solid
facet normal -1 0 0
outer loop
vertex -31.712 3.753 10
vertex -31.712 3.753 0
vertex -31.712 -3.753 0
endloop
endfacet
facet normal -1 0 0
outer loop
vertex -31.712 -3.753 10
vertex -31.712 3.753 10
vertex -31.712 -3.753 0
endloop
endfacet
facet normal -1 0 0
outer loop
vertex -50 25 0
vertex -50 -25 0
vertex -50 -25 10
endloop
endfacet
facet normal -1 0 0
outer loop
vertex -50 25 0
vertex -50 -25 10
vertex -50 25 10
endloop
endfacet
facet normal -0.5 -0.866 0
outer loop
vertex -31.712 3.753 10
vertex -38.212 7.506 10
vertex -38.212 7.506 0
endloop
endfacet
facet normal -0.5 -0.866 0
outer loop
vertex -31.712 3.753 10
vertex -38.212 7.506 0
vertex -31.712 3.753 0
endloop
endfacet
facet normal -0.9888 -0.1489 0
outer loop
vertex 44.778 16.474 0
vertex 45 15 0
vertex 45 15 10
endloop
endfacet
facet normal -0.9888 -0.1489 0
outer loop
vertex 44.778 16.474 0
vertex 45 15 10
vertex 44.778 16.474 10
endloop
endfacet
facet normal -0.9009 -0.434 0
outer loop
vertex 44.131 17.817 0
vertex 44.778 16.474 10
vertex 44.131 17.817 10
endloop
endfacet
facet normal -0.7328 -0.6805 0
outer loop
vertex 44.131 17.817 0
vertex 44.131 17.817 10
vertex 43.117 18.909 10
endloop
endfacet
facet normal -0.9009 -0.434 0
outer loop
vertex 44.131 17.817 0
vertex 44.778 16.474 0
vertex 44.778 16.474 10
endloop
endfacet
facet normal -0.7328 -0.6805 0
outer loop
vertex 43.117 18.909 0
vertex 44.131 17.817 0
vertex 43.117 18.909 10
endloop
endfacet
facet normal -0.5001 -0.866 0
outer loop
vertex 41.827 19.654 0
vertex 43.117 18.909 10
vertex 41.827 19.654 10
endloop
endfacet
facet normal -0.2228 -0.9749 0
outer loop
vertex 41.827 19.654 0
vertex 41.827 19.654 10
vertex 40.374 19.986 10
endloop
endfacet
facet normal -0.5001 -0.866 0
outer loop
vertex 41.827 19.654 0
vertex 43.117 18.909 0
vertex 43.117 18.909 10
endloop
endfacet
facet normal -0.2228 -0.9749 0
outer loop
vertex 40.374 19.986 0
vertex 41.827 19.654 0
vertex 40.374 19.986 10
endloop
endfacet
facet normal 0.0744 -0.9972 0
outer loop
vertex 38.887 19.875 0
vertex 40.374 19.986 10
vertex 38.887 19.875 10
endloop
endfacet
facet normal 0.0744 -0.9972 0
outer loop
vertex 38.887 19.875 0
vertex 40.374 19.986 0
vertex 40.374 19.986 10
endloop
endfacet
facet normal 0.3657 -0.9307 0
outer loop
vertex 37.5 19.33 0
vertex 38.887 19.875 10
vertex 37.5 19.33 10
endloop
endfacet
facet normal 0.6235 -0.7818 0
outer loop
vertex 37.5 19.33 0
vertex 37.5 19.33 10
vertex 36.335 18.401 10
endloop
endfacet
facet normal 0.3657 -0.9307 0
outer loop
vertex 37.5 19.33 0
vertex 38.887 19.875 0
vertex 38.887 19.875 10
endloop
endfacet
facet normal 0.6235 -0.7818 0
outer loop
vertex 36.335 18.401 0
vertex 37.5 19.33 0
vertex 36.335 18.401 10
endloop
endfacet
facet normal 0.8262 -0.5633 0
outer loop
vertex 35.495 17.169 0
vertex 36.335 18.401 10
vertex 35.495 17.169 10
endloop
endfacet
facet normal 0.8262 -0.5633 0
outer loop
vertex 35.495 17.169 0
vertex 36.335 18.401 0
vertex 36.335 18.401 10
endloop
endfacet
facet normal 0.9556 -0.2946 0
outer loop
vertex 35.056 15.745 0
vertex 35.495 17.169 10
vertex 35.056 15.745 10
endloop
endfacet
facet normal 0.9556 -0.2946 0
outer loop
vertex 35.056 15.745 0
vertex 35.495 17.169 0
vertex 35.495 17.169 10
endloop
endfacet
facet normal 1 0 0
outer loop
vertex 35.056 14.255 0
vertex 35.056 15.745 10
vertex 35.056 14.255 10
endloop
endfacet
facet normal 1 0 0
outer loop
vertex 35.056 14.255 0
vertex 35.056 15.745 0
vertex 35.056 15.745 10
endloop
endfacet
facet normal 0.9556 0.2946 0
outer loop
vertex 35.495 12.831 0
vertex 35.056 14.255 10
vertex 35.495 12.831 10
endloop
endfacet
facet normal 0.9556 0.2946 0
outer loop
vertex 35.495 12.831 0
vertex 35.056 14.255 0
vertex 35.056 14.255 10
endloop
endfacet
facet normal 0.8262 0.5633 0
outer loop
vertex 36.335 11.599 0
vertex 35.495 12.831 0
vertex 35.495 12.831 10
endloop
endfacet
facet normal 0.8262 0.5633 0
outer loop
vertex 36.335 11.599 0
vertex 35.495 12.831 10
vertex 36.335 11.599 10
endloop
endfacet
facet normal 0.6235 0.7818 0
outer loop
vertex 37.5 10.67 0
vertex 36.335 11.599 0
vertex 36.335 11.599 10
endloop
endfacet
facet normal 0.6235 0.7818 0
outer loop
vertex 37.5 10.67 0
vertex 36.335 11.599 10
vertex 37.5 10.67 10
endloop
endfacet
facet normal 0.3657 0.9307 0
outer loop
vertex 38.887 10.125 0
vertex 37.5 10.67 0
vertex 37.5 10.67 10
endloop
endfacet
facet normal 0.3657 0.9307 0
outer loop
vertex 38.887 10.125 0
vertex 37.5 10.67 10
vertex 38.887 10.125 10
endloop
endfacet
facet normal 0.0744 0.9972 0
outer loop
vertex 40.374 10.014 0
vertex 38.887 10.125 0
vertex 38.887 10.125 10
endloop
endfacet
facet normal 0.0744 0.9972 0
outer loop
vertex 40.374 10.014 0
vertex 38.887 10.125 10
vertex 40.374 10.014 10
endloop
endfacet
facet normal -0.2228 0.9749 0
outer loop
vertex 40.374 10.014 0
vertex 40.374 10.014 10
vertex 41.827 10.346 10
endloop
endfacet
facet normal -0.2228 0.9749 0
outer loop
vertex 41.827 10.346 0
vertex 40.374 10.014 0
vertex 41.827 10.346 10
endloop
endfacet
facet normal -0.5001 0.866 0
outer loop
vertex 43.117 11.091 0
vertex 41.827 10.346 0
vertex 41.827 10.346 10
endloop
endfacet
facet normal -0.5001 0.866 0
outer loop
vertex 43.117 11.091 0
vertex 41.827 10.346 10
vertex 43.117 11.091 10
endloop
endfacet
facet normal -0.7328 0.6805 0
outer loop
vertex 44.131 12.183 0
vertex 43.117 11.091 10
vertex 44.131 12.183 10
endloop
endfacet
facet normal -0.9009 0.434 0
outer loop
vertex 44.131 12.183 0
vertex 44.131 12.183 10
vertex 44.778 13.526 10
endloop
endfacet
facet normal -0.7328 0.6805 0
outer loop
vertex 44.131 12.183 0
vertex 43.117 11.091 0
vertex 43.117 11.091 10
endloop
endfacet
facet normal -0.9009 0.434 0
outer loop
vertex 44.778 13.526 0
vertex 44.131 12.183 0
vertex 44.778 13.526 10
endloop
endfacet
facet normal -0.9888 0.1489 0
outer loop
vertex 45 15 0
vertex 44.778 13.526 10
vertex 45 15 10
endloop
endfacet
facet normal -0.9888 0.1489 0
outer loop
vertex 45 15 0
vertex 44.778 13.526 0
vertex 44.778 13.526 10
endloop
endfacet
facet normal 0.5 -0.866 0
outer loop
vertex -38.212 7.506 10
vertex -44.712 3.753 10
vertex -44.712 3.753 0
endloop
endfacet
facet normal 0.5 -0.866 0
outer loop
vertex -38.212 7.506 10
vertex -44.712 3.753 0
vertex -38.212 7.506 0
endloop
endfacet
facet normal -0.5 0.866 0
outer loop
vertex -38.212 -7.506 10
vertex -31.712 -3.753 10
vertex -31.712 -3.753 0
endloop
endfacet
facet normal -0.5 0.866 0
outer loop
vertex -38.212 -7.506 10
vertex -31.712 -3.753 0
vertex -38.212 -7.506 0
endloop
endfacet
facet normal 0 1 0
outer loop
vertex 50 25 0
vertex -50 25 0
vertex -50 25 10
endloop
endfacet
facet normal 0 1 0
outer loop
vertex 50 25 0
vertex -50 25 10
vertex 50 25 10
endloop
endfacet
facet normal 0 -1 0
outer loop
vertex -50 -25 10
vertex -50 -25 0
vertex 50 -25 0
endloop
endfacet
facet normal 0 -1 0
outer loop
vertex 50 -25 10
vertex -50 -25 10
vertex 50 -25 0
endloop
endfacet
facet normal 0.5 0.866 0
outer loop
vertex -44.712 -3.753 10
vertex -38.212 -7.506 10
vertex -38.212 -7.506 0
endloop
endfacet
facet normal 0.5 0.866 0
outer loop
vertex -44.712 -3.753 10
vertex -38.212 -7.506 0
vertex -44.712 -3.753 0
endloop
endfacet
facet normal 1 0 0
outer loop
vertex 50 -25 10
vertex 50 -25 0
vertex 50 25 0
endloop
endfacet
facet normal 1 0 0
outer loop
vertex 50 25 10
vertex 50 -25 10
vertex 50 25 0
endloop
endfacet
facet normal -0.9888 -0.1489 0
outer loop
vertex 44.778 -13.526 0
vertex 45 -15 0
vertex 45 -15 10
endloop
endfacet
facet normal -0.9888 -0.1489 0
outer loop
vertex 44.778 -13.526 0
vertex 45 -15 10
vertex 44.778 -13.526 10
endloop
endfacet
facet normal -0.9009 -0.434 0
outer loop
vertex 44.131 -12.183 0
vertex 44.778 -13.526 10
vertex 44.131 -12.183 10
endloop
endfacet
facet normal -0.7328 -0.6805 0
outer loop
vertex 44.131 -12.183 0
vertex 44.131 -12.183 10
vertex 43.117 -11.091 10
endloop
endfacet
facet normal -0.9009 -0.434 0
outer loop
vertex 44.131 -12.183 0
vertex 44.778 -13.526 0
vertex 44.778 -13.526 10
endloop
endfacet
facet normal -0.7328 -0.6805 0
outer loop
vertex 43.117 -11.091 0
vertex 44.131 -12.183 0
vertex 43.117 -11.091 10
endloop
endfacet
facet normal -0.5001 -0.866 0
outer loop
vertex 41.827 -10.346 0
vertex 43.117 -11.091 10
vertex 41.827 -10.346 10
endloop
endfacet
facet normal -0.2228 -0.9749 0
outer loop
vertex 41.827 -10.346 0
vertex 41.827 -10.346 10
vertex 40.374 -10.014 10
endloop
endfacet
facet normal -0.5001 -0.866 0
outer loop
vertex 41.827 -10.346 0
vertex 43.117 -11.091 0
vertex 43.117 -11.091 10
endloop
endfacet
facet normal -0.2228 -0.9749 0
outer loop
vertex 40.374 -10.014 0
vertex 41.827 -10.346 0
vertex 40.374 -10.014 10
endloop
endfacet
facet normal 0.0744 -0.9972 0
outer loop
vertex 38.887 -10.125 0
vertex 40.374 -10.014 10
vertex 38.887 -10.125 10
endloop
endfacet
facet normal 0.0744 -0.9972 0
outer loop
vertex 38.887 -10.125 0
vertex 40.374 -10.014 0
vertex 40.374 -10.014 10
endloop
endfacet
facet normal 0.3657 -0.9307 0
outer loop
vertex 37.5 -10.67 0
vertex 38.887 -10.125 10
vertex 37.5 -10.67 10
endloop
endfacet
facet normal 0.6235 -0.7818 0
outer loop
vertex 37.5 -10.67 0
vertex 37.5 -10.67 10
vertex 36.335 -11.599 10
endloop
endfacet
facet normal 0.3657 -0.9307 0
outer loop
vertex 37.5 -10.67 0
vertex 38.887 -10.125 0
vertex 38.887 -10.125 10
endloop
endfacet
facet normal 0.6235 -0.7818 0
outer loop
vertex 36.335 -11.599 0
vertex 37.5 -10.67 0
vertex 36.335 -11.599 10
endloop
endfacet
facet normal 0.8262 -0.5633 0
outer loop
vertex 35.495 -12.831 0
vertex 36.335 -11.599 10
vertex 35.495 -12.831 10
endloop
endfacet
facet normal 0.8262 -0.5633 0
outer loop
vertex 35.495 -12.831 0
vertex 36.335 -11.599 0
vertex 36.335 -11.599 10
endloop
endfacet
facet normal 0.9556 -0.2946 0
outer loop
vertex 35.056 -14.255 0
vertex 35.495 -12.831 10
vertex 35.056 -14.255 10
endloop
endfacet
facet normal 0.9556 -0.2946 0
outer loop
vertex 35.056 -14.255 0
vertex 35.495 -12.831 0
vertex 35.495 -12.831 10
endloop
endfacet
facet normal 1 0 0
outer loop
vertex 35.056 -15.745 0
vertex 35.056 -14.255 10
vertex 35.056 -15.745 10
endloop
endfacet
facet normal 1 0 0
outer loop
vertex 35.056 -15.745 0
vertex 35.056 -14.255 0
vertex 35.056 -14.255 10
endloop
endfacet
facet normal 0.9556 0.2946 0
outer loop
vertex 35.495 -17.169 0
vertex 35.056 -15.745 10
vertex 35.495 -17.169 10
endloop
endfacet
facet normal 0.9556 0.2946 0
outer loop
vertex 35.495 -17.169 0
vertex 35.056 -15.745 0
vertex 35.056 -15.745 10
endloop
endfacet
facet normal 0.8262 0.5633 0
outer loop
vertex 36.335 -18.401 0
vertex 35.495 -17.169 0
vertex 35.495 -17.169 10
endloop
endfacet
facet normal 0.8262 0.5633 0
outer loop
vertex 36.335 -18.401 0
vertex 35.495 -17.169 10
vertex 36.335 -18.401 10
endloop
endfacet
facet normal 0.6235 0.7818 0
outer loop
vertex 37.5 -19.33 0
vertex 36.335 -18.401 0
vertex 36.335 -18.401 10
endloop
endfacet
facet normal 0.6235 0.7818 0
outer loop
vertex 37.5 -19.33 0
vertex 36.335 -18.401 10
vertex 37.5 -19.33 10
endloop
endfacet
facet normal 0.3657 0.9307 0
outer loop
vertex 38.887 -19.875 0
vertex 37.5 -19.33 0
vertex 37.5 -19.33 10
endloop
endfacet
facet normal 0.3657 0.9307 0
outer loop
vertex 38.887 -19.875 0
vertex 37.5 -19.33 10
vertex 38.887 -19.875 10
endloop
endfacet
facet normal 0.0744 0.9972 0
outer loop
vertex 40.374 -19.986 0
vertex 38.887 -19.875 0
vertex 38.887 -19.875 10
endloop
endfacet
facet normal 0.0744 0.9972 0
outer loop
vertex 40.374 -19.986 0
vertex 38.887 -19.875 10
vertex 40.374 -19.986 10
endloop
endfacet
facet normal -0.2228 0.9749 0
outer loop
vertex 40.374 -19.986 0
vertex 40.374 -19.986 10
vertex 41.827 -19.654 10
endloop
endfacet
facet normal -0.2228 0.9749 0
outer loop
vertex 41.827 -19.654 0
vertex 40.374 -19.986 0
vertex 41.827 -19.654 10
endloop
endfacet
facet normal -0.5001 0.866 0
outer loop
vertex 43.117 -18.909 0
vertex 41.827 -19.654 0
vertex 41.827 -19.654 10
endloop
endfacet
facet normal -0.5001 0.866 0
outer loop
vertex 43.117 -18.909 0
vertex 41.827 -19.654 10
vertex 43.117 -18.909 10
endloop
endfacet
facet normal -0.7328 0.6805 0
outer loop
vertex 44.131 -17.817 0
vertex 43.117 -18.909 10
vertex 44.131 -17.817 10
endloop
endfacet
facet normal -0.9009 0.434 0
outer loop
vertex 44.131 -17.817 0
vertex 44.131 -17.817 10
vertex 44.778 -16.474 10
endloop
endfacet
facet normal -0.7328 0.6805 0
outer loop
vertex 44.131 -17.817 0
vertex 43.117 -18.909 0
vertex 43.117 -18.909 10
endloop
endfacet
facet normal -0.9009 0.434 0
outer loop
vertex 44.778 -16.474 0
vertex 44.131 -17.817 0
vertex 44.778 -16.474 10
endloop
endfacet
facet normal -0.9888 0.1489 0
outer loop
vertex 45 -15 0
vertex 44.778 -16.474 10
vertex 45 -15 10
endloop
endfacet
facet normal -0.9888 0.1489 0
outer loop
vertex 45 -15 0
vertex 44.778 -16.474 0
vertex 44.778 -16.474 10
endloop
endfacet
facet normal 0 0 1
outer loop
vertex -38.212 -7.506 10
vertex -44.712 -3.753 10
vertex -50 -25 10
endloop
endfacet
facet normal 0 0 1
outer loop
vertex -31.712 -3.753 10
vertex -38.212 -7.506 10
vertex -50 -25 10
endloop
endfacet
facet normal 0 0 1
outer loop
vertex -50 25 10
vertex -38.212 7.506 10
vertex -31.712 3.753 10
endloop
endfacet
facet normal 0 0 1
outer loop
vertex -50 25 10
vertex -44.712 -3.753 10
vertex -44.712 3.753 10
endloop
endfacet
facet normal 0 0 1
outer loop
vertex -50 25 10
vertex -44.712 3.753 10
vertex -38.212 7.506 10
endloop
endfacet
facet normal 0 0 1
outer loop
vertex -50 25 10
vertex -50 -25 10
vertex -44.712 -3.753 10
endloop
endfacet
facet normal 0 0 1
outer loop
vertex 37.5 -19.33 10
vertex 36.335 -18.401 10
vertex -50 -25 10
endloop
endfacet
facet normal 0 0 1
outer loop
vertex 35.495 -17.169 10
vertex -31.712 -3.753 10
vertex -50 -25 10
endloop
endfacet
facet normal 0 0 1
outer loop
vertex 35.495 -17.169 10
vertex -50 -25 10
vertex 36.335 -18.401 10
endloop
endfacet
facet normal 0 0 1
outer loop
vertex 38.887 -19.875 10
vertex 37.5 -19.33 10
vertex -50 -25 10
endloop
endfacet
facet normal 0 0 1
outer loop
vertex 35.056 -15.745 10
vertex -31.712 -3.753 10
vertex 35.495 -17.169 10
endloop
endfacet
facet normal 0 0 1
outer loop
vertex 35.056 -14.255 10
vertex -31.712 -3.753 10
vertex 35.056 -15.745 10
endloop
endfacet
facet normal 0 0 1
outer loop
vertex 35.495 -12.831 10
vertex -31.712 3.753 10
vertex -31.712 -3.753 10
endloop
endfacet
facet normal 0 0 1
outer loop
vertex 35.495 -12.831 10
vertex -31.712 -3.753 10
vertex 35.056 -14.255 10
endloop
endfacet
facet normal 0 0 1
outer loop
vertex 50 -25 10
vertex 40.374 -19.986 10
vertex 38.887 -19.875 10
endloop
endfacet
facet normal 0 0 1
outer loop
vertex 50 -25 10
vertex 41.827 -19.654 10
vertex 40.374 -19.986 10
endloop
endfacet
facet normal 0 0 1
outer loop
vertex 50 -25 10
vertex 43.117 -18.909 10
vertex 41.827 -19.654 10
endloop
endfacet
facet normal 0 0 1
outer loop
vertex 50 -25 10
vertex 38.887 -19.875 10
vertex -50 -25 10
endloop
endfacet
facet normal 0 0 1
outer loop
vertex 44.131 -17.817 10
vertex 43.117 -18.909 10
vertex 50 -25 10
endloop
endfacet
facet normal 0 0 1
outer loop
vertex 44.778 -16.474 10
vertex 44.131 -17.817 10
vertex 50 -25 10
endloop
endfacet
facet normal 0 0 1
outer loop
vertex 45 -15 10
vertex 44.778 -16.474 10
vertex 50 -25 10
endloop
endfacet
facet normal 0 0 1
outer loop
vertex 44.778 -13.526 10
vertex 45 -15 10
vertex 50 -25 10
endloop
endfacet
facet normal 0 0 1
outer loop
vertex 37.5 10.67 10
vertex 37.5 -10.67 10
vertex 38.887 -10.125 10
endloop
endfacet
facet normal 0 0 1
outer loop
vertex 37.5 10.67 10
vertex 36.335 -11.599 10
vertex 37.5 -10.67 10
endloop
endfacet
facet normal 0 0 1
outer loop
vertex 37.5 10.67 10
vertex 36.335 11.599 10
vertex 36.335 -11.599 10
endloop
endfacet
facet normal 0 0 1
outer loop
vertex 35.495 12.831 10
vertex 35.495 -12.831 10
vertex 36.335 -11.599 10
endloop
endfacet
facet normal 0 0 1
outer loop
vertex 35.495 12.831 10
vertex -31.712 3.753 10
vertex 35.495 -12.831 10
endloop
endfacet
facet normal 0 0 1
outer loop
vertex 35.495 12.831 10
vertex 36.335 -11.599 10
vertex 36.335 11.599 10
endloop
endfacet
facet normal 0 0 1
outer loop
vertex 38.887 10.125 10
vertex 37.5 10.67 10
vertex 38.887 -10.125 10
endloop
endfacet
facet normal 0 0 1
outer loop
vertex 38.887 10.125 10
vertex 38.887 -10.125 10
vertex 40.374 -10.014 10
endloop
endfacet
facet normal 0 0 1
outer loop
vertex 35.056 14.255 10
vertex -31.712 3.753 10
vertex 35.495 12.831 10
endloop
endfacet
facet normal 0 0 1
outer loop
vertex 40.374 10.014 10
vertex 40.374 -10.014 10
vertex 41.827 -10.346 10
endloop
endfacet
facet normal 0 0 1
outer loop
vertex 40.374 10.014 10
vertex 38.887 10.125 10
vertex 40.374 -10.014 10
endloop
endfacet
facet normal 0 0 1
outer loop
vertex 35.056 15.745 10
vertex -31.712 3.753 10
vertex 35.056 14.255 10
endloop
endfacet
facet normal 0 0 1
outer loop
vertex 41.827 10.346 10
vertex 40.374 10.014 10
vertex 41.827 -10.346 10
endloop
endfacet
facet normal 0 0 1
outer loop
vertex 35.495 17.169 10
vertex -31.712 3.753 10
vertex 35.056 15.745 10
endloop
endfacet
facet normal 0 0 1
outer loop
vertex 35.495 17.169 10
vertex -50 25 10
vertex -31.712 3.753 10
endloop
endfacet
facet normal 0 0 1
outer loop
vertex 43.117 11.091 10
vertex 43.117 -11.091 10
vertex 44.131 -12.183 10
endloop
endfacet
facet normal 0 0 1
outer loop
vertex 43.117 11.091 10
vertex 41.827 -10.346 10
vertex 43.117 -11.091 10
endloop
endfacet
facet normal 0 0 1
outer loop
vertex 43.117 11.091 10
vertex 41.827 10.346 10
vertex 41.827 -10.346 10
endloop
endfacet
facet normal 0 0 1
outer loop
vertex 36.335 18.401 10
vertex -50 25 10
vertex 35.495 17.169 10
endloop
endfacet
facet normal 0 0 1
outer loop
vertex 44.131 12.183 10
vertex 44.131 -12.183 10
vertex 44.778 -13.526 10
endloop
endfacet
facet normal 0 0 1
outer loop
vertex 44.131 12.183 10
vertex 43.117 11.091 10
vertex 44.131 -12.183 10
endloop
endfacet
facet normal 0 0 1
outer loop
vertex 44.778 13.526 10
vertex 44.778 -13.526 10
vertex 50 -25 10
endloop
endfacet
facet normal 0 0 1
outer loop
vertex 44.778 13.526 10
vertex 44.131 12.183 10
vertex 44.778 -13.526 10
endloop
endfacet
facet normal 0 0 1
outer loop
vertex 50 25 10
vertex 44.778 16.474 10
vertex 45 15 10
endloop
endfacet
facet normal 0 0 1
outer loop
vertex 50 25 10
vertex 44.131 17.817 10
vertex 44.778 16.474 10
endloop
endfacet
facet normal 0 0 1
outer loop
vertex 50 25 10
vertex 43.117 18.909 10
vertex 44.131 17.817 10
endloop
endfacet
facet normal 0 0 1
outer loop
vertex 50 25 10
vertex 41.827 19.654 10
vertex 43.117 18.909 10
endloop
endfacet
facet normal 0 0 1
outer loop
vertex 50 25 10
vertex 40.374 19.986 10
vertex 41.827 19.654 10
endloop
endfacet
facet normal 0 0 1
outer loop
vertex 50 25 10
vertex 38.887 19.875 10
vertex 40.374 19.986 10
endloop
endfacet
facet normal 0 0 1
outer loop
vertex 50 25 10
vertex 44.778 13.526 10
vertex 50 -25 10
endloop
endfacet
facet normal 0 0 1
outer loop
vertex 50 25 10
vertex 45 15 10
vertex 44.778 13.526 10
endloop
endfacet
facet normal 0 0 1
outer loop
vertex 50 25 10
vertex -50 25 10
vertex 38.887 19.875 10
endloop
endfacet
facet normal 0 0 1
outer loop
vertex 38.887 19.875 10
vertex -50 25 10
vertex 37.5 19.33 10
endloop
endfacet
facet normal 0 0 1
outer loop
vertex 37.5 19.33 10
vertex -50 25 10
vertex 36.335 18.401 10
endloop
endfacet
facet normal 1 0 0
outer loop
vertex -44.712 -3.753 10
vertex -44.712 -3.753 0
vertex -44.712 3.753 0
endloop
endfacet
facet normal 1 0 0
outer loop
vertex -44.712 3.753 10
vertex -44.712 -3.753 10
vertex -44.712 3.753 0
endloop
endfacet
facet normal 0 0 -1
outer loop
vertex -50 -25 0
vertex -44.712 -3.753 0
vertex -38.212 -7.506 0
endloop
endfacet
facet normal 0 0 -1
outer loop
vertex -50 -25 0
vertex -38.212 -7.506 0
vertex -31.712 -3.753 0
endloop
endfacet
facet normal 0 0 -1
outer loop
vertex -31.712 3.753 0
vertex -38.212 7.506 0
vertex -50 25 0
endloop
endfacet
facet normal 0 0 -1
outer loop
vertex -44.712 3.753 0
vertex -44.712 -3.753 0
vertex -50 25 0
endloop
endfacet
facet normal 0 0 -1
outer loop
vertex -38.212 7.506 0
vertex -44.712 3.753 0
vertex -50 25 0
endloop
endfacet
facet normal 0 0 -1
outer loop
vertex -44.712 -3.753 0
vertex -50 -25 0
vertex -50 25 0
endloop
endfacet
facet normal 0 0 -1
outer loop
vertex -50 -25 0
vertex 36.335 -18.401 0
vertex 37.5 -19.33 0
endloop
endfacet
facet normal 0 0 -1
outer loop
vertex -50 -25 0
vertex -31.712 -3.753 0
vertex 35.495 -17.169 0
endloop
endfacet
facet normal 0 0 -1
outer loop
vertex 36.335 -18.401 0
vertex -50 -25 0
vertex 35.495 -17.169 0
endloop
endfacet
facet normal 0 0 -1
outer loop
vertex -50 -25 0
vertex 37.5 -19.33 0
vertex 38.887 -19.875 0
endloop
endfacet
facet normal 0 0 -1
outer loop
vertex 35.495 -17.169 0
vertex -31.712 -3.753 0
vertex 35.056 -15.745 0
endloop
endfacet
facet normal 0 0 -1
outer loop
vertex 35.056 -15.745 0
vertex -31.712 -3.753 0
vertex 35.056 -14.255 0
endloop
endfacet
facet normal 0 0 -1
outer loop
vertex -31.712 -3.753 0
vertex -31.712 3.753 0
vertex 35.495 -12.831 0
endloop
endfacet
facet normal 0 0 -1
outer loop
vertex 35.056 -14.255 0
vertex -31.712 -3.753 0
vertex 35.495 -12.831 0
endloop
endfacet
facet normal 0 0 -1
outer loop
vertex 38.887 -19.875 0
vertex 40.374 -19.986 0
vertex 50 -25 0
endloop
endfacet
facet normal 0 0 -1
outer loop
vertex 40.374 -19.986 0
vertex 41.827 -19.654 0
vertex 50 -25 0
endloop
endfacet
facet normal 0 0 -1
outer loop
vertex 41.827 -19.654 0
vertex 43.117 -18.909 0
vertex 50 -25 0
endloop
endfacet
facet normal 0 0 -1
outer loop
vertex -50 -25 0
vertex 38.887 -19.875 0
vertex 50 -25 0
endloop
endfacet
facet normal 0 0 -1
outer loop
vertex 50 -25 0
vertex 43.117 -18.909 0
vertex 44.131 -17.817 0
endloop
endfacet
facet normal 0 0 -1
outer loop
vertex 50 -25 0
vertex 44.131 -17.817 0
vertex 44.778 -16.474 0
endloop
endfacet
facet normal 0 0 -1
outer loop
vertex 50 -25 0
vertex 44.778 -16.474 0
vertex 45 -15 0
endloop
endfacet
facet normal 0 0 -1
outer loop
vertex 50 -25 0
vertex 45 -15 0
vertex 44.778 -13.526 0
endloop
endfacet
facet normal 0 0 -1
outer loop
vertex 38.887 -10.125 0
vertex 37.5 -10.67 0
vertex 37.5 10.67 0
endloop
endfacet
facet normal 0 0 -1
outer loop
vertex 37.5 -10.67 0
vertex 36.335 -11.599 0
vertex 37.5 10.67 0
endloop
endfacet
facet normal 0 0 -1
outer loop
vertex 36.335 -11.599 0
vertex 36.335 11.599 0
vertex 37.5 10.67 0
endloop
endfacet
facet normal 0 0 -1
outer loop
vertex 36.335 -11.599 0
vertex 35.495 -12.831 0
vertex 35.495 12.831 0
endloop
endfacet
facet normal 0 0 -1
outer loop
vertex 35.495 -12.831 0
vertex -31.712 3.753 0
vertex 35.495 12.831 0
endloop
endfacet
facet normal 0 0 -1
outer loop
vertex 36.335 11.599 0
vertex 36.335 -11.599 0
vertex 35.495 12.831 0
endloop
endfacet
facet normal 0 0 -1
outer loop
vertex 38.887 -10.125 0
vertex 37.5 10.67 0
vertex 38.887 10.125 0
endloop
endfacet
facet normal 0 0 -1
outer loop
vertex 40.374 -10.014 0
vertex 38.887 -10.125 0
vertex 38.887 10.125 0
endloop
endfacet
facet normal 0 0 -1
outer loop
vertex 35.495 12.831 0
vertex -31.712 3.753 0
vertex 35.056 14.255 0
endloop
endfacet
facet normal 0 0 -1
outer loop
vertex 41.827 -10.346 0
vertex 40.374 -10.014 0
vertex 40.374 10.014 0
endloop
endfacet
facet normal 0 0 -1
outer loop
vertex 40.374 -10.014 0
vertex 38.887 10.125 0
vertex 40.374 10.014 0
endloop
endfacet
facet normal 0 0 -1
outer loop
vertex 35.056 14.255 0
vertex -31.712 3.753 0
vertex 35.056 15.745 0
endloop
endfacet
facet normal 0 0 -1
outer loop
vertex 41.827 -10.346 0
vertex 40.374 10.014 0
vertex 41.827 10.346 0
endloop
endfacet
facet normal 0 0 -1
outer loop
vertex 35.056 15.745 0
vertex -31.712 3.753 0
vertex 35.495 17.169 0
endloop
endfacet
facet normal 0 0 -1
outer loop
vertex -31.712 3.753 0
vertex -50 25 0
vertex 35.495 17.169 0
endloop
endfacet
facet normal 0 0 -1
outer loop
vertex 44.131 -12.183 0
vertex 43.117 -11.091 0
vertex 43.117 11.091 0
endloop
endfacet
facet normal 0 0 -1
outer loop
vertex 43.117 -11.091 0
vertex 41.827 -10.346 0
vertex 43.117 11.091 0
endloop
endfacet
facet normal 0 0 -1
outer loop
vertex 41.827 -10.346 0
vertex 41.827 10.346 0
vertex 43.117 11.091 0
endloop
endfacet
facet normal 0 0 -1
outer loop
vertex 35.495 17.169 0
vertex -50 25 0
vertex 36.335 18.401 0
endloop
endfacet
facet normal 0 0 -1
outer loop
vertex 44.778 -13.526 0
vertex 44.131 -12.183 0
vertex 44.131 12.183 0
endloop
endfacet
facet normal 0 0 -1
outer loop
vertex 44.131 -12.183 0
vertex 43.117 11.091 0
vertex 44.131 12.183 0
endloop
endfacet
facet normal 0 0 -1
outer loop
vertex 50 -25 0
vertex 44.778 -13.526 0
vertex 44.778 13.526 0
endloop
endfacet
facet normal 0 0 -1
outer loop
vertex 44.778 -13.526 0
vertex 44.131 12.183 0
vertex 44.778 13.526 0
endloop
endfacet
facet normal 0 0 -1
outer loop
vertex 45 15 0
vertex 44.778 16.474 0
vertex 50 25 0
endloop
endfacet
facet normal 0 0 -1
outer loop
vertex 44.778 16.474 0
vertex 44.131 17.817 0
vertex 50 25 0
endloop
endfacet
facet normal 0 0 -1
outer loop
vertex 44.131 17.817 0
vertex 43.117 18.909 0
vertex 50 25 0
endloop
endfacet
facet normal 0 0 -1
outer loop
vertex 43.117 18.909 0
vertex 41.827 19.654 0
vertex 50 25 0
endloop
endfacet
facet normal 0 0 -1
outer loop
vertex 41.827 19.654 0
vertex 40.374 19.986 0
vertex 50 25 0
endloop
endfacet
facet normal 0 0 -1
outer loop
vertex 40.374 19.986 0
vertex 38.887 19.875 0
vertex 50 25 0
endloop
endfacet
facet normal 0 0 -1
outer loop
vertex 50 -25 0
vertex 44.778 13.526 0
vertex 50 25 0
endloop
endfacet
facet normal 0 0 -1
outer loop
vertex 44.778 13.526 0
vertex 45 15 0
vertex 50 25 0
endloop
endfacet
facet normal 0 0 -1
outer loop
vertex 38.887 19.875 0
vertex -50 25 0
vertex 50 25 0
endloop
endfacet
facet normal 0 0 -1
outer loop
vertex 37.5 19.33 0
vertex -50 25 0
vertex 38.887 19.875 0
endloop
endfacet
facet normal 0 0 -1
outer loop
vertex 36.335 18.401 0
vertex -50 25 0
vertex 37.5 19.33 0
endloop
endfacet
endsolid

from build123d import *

# Parameters (mm, degrees)
F0_W     = 100
F0_H     = 50
F0_R     = 5
F1_DEPTH = 10


with BuildPart() as f1:
    # F0 (on Top) → F1 (new body)
    with BuildSketch(Plane.XY):
        Rectangle(F0_W, F0_H)
        with Locations((40, -15)):
            Circle(F0_R, mode=Mode.SUBTRACT)
        Polygon((-31.711863, 3.752777), (-31.711863, -3.752777), (-38.211863, -7.505553), (-44.711863, -3.752777), (-44.711863, 3.752777), (-38.211863, 7.505553), align=None, mode=Mode.SUBTRACT)
        with Locations((40, 15)):
            Circle(F0_R, mode=Mode.SUBTRACT)
    extrude(amount=F1_DEPTH)


solid = f1.part
